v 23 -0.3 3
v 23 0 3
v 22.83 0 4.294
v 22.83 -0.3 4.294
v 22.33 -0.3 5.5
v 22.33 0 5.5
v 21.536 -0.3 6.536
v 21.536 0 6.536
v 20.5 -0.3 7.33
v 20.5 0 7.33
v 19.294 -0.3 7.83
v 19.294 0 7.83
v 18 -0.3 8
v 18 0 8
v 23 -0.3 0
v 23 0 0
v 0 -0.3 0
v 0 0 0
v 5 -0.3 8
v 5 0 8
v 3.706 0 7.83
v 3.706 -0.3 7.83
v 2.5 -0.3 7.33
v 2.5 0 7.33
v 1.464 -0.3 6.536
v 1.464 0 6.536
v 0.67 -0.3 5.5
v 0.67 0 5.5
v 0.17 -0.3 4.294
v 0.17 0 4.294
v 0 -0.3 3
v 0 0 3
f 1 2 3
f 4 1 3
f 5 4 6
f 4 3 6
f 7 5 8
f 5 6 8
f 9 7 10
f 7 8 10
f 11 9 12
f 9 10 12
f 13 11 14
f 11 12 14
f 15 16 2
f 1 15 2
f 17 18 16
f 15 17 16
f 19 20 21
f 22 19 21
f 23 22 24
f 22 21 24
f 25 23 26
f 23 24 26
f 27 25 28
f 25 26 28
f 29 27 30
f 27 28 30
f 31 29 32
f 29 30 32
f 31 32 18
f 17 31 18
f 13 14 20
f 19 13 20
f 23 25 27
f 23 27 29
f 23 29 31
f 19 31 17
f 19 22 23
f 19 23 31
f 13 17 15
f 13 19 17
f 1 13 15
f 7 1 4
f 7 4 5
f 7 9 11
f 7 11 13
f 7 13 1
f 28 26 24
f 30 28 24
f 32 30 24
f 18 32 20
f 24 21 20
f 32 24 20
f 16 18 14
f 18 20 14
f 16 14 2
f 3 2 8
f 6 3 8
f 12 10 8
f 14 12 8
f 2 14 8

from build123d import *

# Parameters (mm, degrees)
F1_DEPTH = 0.3


with BuildPart() as f1:
    # F0 (on Front) → F1 (new body)
    with BuildSketch(Plane.XZ):
        with BuildLine():
            Line((0, 3), (0, 0))
            Line((0, 0), (23, 0))
            Line((23, 0), (23, 3))
            ThreePointArc((23, 3), (21.535534, 6.535534), (18, 8))
            Line((18, 8), (5, 8))
            ThreePointArc((5, 8), (1.464466, 6.535534), (0, 3))
        make_face()
    extrude(amount=F1_DEPTH)


solid = f1.part
